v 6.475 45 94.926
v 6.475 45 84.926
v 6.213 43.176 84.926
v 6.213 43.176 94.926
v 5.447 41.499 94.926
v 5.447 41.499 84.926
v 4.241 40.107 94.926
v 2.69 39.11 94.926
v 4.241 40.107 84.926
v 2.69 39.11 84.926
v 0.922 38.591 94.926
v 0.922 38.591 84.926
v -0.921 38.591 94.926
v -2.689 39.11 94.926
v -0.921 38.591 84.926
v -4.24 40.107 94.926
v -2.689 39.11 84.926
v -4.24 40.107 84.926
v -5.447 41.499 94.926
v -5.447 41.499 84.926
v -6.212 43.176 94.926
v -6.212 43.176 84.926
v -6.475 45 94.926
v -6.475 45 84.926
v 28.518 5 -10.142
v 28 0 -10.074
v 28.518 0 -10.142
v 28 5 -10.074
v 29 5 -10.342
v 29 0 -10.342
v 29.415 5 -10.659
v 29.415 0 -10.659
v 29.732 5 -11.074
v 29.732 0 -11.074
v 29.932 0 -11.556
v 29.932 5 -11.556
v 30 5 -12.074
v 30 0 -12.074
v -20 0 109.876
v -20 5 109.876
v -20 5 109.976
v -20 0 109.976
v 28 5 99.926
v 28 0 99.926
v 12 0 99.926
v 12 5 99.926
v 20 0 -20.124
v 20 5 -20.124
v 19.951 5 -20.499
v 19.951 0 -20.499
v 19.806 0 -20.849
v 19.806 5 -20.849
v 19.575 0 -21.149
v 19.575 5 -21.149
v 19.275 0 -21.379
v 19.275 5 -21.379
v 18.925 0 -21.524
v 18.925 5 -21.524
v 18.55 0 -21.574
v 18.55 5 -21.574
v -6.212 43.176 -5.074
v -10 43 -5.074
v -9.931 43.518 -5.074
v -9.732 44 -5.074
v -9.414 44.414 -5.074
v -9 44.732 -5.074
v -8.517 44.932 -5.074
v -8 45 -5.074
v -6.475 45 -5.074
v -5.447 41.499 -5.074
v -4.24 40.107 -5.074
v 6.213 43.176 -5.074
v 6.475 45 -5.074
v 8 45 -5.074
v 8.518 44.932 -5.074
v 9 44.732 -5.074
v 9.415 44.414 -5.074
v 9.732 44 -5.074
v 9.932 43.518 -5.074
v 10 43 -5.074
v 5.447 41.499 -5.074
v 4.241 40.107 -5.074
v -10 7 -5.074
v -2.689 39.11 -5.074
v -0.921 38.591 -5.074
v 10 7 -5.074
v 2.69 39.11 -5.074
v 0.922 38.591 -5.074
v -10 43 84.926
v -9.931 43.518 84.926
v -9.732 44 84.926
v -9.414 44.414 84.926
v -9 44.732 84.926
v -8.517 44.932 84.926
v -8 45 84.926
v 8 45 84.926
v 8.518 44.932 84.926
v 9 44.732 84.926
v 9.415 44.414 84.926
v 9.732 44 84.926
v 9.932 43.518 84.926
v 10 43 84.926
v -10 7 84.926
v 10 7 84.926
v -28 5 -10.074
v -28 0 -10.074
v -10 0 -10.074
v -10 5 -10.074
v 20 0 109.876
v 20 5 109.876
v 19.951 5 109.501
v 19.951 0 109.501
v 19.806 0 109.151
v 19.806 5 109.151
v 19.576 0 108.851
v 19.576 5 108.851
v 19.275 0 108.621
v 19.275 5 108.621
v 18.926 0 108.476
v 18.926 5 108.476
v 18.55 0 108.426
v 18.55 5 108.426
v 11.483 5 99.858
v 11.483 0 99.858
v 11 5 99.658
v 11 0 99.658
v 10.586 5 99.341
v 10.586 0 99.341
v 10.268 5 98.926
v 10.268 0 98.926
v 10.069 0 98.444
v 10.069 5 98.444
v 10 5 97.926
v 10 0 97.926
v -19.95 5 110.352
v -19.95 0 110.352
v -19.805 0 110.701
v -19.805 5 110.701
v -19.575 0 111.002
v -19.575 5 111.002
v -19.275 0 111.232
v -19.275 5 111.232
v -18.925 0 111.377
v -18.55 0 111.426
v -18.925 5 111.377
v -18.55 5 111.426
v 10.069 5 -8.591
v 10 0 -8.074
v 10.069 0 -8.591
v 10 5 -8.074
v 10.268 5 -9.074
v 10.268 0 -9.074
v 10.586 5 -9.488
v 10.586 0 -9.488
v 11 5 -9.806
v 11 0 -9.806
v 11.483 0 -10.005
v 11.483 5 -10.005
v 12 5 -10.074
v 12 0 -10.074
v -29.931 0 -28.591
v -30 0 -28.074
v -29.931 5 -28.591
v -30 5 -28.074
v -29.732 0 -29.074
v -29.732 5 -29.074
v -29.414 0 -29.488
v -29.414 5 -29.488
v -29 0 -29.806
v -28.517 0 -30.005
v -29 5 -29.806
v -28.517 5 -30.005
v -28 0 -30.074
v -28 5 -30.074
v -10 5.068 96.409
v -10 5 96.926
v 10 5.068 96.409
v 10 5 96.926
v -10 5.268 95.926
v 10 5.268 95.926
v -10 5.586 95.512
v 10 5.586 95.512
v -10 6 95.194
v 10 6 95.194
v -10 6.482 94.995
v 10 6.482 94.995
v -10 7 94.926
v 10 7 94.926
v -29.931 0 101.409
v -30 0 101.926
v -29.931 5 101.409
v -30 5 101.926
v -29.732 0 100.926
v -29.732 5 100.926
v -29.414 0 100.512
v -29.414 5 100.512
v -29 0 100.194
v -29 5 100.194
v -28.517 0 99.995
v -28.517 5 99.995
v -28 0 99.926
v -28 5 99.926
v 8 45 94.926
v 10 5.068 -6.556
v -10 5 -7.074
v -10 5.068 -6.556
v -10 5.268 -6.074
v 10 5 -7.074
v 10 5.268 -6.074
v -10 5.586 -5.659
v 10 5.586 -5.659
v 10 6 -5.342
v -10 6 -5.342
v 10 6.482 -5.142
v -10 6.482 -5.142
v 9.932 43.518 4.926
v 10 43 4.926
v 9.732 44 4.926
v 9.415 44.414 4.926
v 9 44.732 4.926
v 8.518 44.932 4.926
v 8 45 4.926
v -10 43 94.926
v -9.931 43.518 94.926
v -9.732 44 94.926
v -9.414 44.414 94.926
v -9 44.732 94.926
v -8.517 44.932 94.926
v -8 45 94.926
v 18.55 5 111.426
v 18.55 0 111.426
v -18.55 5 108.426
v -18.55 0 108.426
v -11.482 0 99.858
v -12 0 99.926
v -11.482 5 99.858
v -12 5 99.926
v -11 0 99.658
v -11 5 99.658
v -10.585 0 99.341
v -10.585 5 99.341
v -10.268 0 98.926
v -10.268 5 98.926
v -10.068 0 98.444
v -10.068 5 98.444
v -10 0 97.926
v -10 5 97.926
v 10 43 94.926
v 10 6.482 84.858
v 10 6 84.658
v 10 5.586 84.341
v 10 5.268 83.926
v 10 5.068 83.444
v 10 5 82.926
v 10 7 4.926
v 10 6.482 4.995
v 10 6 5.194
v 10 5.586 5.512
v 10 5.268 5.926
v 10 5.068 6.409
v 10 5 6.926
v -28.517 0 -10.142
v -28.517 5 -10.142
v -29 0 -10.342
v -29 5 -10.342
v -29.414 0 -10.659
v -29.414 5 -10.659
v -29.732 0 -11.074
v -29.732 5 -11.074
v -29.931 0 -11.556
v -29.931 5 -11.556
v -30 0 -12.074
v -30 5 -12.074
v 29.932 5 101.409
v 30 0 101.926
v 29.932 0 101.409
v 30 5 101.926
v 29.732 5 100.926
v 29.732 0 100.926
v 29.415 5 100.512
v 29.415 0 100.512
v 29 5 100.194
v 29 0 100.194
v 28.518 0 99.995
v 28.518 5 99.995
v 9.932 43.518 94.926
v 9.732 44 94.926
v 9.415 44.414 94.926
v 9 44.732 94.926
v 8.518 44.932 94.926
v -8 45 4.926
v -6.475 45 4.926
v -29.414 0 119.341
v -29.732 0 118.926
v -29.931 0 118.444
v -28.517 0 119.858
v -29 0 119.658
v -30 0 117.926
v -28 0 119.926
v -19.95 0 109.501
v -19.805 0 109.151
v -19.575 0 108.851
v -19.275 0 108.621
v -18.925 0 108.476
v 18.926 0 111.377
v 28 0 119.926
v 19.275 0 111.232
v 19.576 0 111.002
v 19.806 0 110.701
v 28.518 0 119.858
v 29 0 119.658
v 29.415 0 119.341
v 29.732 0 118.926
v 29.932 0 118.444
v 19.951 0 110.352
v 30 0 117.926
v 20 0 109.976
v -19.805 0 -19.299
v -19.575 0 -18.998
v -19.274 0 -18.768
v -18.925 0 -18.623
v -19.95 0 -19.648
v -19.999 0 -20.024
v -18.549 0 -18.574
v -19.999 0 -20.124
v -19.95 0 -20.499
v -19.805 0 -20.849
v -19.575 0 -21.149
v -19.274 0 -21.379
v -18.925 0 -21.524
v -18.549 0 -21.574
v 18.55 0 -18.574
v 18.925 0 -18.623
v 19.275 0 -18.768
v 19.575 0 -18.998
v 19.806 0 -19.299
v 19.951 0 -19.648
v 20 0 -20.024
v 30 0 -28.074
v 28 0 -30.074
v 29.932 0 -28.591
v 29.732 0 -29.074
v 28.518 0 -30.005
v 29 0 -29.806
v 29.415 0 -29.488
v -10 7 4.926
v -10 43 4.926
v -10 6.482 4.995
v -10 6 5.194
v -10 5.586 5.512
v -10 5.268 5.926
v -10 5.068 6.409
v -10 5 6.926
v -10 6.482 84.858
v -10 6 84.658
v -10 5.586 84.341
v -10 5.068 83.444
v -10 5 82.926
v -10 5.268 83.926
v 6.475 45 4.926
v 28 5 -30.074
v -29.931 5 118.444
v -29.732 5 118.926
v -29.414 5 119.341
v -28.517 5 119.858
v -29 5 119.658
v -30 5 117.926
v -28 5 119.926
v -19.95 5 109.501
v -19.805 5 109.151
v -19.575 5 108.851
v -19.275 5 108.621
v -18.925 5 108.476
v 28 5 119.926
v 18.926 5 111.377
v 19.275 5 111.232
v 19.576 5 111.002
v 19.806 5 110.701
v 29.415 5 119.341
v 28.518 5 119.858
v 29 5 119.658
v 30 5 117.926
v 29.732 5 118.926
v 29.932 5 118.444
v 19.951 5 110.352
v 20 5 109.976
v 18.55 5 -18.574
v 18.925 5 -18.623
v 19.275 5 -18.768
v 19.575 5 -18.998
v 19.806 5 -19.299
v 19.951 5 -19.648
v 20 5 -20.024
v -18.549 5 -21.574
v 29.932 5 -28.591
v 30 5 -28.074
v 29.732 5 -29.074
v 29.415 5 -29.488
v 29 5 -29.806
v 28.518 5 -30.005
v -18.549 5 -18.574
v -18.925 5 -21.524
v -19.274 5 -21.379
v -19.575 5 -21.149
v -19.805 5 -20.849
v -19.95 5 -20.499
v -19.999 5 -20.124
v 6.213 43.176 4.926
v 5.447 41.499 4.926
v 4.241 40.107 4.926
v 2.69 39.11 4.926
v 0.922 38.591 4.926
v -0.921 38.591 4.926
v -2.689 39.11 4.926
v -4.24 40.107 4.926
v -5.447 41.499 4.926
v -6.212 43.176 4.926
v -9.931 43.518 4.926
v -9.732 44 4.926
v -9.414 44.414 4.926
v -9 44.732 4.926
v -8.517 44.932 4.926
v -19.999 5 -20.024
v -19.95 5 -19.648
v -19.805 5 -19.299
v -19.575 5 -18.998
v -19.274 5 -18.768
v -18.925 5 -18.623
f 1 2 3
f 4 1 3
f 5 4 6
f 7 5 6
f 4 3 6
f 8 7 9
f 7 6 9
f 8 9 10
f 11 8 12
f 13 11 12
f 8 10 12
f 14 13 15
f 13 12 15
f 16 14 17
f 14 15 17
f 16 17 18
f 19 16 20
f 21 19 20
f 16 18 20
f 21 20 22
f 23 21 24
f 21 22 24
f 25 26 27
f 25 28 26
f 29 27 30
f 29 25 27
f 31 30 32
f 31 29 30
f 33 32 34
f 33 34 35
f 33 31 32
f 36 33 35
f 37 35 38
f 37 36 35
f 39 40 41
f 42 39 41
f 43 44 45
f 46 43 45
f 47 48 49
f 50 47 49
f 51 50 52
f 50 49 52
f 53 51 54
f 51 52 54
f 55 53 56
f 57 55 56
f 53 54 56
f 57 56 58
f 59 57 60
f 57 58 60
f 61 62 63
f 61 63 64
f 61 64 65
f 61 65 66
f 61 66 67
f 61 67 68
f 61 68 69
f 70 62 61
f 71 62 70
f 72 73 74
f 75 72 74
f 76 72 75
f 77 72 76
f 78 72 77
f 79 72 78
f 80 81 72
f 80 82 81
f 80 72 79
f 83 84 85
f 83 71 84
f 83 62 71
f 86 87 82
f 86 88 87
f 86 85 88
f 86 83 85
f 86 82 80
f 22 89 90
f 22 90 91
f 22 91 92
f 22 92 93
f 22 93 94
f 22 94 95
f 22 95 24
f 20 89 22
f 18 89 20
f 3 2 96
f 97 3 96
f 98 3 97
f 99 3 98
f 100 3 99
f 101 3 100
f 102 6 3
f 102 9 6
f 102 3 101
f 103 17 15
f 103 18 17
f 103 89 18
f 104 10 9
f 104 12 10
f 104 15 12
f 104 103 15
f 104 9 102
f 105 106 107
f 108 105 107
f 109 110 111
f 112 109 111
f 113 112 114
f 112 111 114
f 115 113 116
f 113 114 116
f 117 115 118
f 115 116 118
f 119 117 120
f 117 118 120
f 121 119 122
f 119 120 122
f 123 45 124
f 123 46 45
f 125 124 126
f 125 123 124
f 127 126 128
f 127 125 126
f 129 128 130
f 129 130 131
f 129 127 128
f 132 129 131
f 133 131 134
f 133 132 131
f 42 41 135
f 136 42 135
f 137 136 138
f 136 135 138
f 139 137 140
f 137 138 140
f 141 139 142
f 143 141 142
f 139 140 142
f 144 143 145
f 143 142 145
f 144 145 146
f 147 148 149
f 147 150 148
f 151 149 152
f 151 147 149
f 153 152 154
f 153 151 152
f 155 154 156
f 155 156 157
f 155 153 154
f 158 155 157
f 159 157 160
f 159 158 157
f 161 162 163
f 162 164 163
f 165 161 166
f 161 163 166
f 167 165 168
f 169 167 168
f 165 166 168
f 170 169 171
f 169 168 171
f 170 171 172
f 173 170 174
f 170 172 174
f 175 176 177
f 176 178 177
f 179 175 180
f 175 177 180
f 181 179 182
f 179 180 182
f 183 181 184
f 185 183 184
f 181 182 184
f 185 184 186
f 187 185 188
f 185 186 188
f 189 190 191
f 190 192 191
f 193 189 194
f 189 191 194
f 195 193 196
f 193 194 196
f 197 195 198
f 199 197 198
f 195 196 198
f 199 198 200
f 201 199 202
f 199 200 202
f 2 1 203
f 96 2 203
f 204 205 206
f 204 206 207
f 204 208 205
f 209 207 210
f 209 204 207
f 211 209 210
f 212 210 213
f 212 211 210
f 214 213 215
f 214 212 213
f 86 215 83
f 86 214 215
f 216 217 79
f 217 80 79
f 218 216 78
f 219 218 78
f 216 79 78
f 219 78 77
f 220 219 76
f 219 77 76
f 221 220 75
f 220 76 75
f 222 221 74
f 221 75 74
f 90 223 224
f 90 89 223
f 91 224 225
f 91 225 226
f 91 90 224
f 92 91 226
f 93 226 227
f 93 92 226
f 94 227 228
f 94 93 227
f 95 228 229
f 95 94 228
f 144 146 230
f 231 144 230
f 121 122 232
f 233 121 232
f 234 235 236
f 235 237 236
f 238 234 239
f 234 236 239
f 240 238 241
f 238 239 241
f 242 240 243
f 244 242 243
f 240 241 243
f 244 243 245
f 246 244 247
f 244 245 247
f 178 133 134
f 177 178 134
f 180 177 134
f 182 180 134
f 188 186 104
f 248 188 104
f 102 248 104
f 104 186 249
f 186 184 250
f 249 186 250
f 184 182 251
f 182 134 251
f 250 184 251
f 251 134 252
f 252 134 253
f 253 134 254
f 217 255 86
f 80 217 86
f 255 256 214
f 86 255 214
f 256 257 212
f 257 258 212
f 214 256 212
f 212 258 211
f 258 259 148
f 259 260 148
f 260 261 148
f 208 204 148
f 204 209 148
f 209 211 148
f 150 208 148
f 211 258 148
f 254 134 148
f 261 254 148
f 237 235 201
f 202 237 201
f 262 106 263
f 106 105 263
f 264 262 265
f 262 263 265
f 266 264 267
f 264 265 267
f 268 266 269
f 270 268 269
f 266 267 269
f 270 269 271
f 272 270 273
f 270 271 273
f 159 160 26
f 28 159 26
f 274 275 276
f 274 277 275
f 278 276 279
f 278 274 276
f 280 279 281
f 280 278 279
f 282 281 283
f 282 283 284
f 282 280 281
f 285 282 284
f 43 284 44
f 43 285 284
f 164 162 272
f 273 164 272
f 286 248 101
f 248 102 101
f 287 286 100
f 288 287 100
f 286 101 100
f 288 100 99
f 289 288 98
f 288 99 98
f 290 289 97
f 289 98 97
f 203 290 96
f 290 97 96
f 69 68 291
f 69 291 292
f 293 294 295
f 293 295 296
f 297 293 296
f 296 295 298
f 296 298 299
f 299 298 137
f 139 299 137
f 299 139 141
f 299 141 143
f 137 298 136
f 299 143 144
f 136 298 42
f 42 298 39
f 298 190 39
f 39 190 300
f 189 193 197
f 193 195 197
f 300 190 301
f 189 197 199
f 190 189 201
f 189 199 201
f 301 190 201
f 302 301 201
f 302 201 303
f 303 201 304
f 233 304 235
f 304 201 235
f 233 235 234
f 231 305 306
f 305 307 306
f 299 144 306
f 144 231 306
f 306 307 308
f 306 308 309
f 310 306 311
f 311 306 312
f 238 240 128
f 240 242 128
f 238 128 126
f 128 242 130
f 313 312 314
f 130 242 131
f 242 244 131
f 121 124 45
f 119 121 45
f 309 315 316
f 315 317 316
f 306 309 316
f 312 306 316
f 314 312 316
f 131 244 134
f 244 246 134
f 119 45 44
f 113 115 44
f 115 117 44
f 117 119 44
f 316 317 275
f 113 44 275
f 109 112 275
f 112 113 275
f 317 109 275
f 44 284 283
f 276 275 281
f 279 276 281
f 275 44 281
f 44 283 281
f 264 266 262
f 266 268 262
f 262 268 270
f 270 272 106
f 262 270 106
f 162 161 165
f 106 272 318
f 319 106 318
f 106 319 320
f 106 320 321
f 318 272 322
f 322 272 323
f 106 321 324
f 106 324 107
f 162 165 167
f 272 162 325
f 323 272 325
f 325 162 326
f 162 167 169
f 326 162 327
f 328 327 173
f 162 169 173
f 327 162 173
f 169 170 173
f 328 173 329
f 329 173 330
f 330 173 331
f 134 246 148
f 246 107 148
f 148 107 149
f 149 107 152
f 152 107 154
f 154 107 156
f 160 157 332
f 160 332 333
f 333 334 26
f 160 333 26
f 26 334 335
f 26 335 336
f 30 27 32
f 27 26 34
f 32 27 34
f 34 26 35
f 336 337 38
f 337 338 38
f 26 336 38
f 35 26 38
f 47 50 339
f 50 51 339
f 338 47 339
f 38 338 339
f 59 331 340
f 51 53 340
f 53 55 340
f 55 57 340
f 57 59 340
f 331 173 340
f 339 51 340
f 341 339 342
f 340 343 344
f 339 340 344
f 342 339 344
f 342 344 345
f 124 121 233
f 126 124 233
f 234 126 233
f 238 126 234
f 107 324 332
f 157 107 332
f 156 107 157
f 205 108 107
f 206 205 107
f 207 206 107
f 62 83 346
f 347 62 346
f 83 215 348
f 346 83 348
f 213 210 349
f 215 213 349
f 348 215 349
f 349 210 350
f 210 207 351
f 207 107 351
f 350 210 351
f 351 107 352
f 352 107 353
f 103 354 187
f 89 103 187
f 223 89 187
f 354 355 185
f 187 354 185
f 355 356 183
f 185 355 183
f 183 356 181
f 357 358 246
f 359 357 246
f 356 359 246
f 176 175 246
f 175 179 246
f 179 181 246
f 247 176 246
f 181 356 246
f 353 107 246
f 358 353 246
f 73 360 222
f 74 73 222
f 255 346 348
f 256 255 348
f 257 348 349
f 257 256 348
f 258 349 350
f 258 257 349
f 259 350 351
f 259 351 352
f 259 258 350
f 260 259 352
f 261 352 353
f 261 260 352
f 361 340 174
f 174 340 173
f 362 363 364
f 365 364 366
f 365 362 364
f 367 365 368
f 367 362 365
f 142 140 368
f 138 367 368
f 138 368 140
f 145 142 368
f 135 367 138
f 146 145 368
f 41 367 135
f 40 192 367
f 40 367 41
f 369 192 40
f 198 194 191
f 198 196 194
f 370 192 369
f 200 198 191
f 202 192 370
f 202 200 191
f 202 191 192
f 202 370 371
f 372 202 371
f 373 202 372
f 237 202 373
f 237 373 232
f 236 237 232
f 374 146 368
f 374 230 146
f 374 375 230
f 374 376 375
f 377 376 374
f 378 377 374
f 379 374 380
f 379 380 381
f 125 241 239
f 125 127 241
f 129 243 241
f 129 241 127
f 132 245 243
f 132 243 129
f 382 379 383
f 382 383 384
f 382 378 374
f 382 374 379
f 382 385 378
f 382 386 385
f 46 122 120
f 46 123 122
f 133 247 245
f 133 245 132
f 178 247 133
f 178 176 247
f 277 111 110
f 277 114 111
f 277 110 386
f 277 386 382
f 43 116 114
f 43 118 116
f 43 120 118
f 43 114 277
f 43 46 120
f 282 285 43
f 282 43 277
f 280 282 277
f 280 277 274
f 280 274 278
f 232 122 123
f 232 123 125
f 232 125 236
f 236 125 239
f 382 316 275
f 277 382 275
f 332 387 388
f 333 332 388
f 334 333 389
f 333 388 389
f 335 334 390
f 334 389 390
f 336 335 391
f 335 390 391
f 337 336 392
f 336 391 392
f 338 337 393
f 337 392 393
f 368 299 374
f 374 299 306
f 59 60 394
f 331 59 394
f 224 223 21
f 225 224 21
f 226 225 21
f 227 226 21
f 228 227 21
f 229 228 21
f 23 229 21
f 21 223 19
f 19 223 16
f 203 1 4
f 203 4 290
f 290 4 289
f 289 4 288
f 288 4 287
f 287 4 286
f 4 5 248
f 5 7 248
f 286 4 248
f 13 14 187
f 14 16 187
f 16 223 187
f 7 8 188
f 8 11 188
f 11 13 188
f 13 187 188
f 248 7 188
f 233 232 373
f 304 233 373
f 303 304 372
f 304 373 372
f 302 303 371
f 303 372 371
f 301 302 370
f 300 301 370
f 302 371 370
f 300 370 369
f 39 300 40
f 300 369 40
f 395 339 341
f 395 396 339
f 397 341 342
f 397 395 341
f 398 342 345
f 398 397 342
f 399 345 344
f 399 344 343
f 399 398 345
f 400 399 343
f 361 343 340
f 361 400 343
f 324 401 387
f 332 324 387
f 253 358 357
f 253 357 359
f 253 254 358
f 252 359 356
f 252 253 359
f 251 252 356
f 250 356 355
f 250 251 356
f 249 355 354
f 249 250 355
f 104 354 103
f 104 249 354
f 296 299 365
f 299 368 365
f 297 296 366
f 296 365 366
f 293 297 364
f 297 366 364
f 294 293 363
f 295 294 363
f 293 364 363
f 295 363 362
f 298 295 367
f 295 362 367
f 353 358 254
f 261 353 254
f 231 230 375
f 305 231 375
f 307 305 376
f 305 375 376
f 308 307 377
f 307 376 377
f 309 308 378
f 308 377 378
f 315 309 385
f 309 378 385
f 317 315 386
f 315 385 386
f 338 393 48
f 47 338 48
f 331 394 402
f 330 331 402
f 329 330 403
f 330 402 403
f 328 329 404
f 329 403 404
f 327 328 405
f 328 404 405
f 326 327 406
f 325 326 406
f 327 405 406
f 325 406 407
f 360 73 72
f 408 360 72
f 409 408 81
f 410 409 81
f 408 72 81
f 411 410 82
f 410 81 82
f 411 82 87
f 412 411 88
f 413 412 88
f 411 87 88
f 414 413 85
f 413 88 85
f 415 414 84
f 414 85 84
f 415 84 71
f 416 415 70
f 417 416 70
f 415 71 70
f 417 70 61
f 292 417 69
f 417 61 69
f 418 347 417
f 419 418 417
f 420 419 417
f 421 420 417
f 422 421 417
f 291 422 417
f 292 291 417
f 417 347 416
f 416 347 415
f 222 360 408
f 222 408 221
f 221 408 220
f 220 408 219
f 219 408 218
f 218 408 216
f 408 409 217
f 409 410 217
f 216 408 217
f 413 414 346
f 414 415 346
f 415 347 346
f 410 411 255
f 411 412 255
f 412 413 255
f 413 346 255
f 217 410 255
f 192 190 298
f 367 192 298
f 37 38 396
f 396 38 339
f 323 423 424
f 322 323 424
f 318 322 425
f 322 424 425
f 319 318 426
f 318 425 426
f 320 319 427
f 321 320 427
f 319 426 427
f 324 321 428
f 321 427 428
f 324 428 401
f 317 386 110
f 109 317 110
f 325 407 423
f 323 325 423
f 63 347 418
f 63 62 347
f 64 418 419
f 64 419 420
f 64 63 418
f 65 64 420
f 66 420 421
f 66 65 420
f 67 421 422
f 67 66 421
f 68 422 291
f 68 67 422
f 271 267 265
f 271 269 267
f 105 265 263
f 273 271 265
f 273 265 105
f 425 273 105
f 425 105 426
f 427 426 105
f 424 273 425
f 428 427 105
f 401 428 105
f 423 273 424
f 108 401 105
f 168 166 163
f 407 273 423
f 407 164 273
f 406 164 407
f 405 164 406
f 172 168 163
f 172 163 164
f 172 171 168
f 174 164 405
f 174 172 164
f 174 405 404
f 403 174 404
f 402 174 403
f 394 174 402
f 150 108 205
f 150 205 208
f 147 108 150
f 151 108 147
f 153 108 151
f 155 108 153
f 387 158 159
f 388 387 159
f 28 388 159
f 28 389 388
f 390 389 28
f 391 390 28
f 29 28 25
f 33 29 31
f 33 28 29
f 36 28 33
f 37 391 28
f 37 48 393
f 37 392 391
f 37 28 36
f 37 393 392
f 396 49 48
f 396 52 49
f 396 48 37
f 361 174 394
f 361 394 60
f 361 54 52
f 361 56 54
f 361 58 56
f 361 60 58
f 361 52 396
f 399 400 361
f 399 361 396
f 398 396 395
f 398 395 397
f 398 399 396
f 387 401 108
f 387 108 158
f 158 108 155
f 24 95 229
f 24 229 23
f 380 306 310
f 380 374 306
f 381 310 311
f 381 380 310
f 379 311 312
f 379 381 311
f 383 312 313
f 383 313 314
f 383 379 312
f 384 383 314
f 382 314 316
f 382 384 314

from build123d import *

# Parameters (mm, degrees)
BOSS_EXTRUDE1_DEPTH = 5
CUT_EXTRUDE1_DEPTH  = 124.722915669
SKETCH3_W           = 20
SKETCH3_H           = 10
BOSS_EXTRUDE2_DEPTH = 40
SKETCH4_R           = 6.475
CUT_EXTRUDE2_DEPTH  = 137.198467549
FILLET3_R           = 2


with BuildPart() as part:
    # Sketch1 → Boss-Extrude1 (new body)
    with BuildSketch(Plane(origin=(0, 0, 0), x_dir=(1, 0, 0), z_dir=(0, 1, 0))):
        Polygon((-29.999623956, -119.926382831), (30.000376044, -119.926382831), (30.000376044, -99.926382831), (10.000376044, -99.926382831), (10.000376044, 10.073617169), (30.000376044, 10.073617169), (30.000376044, 30.073617169), (-29.999623956, 30.073617169), (-29.999623956, 10.073617169), (-9.999623956, 10.073617169), (-9.999623956, -99.926382831), (-29.999623956, -99.926382831), align=None)
    extrude(amount=BOSS_EXTRUDE1_DEPTH)

    # Sketch2 → Cut-Extrude1 (cut, through all)
    with BuildSketch(Plane(origin=(0, 5, 0), x_dir=(1, 0, 0), z_dir=(0, 1, 0))):
        with BuildLine():
            Line((-18.549247911, 18.573617169), (18.55, 18.573617169))
            ThreePointArc((18.55, 18.573617169), (19.575304833, 18.998312337), (20, 20.023617169))
            Line((20, 20.023617169), (20, 20.123617169))
            ThreePointArc((20, 20.123617169), (19.575304833, 21.148922002), (18.55, 21.573617169))
            Line((18.55, 21.573617169), (-18.549247911, 21.573617169))
            ThreePointArc((-18.549247911, 21.573617169), (-19.574552744, 21.148922002), (-19.999247911, 20.123617169))
            Line((-19.999247911, 20.123617169), (-19.999247911, 20.023617169))
            ThreePointArc((-19.999247911, 20.023617169), (-19.574552744, 18.998312337), (-18.549247911, 18.573617169))
        make_face()
        with BuildLine():
            Line((-18.549623956, -111.426382831), (18.550376044, -111.426382831))
            ThreePointArc((18.550376044, -111.426382831), (19.575680877, -111.001687663), (20.000376044, -109.976382831))
            Line((20.000376044, -109.976382831), (20.000376044, -109.876382831))
            ThreePointArc((20.000376044, -109.876382831), (19.575680877, -108.851077998), (18.550376044, -108.426382831))
            Line((18.550376044, -108.426382831), (-18.549623956, -108.426382831))
            ThreePointArc((-18.549623956, -108.426382831), (-19.574928788, -108.851077998), (-19.999623956, -109.876382831))
            Line((-19.999623956, -109.876382831), (-19.999623956, -109.976382831))
            ThreePointArc((-19.999623956, -109.976382831), (-19.574928788, -111.001687663), (-18.549623956, -111.426382831))
        make_face()
    extrude(amount=-CUT_EXTRUDE1_DEPTH, mode=Mode.SUBTRACT)

    # Sketch3 → Boss-Extrude2 (add)
    with BuildSketch(Plane(origin=(0, 5, 0), x_dir=(1, 0, 0), z_dir=(0, 1, 0))):
        with Locations((0.000376044, 0.073617169)):
            Rectangle(SKETCH3_W, SKETCH3_H)
        with Locations((0.000376044, -89.926382831)):
            Rectangle(SKETCH3_W, SKETCH3_H)
    extrude(amount=BOSS_EXTRUDE2_DEPTH)

    # Sketch4 → Cut-Extrude2 (cut, through all)
    with BuildSketch(Plane(origin=(0, 0, -5.073617169), x_dir=(-1, 0, 0), z_dir=(0, 0, -1))):
        with Locations((-0.000376044, 45)):
            Circle(SKETCH4_R)
    extrude(amount=-CUT_EXTRUDE2_DEPTH, mode=Mode.SUBTRACT)

    # Fillet3
    fillet3_edges = [part.edges().sort_by_distance(p)[0] for p in [
        (-9.999623956, 45, 89.926382831),
        (10.000376044, 45, 89.926382831),
        (0.000376044, 5, 84.926382831),
        (0.000376044, 5, 94.926382831),
        (-29.999623956, 2.5, -10.073617169),
        (-29.999623956, 2.5, -30.073617169),
        (30.000376044, 2.5, -30.073617169),
        (30.000376044, 2.5, -10.073617169),
        (10.000376044, 2.5, -10.073617169),
        (10.000376044, 2.5, 99.926382831),
        (30.000376044, 2.5, 99.926382831),
        (30.000376044, 2.5, 119.926382831),
        (-29.999623956, 2.5, 119.926382831),
        (-29.999623956, 2.5, 99.926382831),
        (-9.999623956, 2.5, 99.926382831),
        (0.000376044, 5, -5.073617169),
        (0.000376044, 5, 4.926382831),
        (10.000376044, 45, -0.073617169),
        (-9.999623956, 45, -0.073617169),
    ]]
    fillet(fillet3_edges, radius=FILLET3_R)


solid = part.part
